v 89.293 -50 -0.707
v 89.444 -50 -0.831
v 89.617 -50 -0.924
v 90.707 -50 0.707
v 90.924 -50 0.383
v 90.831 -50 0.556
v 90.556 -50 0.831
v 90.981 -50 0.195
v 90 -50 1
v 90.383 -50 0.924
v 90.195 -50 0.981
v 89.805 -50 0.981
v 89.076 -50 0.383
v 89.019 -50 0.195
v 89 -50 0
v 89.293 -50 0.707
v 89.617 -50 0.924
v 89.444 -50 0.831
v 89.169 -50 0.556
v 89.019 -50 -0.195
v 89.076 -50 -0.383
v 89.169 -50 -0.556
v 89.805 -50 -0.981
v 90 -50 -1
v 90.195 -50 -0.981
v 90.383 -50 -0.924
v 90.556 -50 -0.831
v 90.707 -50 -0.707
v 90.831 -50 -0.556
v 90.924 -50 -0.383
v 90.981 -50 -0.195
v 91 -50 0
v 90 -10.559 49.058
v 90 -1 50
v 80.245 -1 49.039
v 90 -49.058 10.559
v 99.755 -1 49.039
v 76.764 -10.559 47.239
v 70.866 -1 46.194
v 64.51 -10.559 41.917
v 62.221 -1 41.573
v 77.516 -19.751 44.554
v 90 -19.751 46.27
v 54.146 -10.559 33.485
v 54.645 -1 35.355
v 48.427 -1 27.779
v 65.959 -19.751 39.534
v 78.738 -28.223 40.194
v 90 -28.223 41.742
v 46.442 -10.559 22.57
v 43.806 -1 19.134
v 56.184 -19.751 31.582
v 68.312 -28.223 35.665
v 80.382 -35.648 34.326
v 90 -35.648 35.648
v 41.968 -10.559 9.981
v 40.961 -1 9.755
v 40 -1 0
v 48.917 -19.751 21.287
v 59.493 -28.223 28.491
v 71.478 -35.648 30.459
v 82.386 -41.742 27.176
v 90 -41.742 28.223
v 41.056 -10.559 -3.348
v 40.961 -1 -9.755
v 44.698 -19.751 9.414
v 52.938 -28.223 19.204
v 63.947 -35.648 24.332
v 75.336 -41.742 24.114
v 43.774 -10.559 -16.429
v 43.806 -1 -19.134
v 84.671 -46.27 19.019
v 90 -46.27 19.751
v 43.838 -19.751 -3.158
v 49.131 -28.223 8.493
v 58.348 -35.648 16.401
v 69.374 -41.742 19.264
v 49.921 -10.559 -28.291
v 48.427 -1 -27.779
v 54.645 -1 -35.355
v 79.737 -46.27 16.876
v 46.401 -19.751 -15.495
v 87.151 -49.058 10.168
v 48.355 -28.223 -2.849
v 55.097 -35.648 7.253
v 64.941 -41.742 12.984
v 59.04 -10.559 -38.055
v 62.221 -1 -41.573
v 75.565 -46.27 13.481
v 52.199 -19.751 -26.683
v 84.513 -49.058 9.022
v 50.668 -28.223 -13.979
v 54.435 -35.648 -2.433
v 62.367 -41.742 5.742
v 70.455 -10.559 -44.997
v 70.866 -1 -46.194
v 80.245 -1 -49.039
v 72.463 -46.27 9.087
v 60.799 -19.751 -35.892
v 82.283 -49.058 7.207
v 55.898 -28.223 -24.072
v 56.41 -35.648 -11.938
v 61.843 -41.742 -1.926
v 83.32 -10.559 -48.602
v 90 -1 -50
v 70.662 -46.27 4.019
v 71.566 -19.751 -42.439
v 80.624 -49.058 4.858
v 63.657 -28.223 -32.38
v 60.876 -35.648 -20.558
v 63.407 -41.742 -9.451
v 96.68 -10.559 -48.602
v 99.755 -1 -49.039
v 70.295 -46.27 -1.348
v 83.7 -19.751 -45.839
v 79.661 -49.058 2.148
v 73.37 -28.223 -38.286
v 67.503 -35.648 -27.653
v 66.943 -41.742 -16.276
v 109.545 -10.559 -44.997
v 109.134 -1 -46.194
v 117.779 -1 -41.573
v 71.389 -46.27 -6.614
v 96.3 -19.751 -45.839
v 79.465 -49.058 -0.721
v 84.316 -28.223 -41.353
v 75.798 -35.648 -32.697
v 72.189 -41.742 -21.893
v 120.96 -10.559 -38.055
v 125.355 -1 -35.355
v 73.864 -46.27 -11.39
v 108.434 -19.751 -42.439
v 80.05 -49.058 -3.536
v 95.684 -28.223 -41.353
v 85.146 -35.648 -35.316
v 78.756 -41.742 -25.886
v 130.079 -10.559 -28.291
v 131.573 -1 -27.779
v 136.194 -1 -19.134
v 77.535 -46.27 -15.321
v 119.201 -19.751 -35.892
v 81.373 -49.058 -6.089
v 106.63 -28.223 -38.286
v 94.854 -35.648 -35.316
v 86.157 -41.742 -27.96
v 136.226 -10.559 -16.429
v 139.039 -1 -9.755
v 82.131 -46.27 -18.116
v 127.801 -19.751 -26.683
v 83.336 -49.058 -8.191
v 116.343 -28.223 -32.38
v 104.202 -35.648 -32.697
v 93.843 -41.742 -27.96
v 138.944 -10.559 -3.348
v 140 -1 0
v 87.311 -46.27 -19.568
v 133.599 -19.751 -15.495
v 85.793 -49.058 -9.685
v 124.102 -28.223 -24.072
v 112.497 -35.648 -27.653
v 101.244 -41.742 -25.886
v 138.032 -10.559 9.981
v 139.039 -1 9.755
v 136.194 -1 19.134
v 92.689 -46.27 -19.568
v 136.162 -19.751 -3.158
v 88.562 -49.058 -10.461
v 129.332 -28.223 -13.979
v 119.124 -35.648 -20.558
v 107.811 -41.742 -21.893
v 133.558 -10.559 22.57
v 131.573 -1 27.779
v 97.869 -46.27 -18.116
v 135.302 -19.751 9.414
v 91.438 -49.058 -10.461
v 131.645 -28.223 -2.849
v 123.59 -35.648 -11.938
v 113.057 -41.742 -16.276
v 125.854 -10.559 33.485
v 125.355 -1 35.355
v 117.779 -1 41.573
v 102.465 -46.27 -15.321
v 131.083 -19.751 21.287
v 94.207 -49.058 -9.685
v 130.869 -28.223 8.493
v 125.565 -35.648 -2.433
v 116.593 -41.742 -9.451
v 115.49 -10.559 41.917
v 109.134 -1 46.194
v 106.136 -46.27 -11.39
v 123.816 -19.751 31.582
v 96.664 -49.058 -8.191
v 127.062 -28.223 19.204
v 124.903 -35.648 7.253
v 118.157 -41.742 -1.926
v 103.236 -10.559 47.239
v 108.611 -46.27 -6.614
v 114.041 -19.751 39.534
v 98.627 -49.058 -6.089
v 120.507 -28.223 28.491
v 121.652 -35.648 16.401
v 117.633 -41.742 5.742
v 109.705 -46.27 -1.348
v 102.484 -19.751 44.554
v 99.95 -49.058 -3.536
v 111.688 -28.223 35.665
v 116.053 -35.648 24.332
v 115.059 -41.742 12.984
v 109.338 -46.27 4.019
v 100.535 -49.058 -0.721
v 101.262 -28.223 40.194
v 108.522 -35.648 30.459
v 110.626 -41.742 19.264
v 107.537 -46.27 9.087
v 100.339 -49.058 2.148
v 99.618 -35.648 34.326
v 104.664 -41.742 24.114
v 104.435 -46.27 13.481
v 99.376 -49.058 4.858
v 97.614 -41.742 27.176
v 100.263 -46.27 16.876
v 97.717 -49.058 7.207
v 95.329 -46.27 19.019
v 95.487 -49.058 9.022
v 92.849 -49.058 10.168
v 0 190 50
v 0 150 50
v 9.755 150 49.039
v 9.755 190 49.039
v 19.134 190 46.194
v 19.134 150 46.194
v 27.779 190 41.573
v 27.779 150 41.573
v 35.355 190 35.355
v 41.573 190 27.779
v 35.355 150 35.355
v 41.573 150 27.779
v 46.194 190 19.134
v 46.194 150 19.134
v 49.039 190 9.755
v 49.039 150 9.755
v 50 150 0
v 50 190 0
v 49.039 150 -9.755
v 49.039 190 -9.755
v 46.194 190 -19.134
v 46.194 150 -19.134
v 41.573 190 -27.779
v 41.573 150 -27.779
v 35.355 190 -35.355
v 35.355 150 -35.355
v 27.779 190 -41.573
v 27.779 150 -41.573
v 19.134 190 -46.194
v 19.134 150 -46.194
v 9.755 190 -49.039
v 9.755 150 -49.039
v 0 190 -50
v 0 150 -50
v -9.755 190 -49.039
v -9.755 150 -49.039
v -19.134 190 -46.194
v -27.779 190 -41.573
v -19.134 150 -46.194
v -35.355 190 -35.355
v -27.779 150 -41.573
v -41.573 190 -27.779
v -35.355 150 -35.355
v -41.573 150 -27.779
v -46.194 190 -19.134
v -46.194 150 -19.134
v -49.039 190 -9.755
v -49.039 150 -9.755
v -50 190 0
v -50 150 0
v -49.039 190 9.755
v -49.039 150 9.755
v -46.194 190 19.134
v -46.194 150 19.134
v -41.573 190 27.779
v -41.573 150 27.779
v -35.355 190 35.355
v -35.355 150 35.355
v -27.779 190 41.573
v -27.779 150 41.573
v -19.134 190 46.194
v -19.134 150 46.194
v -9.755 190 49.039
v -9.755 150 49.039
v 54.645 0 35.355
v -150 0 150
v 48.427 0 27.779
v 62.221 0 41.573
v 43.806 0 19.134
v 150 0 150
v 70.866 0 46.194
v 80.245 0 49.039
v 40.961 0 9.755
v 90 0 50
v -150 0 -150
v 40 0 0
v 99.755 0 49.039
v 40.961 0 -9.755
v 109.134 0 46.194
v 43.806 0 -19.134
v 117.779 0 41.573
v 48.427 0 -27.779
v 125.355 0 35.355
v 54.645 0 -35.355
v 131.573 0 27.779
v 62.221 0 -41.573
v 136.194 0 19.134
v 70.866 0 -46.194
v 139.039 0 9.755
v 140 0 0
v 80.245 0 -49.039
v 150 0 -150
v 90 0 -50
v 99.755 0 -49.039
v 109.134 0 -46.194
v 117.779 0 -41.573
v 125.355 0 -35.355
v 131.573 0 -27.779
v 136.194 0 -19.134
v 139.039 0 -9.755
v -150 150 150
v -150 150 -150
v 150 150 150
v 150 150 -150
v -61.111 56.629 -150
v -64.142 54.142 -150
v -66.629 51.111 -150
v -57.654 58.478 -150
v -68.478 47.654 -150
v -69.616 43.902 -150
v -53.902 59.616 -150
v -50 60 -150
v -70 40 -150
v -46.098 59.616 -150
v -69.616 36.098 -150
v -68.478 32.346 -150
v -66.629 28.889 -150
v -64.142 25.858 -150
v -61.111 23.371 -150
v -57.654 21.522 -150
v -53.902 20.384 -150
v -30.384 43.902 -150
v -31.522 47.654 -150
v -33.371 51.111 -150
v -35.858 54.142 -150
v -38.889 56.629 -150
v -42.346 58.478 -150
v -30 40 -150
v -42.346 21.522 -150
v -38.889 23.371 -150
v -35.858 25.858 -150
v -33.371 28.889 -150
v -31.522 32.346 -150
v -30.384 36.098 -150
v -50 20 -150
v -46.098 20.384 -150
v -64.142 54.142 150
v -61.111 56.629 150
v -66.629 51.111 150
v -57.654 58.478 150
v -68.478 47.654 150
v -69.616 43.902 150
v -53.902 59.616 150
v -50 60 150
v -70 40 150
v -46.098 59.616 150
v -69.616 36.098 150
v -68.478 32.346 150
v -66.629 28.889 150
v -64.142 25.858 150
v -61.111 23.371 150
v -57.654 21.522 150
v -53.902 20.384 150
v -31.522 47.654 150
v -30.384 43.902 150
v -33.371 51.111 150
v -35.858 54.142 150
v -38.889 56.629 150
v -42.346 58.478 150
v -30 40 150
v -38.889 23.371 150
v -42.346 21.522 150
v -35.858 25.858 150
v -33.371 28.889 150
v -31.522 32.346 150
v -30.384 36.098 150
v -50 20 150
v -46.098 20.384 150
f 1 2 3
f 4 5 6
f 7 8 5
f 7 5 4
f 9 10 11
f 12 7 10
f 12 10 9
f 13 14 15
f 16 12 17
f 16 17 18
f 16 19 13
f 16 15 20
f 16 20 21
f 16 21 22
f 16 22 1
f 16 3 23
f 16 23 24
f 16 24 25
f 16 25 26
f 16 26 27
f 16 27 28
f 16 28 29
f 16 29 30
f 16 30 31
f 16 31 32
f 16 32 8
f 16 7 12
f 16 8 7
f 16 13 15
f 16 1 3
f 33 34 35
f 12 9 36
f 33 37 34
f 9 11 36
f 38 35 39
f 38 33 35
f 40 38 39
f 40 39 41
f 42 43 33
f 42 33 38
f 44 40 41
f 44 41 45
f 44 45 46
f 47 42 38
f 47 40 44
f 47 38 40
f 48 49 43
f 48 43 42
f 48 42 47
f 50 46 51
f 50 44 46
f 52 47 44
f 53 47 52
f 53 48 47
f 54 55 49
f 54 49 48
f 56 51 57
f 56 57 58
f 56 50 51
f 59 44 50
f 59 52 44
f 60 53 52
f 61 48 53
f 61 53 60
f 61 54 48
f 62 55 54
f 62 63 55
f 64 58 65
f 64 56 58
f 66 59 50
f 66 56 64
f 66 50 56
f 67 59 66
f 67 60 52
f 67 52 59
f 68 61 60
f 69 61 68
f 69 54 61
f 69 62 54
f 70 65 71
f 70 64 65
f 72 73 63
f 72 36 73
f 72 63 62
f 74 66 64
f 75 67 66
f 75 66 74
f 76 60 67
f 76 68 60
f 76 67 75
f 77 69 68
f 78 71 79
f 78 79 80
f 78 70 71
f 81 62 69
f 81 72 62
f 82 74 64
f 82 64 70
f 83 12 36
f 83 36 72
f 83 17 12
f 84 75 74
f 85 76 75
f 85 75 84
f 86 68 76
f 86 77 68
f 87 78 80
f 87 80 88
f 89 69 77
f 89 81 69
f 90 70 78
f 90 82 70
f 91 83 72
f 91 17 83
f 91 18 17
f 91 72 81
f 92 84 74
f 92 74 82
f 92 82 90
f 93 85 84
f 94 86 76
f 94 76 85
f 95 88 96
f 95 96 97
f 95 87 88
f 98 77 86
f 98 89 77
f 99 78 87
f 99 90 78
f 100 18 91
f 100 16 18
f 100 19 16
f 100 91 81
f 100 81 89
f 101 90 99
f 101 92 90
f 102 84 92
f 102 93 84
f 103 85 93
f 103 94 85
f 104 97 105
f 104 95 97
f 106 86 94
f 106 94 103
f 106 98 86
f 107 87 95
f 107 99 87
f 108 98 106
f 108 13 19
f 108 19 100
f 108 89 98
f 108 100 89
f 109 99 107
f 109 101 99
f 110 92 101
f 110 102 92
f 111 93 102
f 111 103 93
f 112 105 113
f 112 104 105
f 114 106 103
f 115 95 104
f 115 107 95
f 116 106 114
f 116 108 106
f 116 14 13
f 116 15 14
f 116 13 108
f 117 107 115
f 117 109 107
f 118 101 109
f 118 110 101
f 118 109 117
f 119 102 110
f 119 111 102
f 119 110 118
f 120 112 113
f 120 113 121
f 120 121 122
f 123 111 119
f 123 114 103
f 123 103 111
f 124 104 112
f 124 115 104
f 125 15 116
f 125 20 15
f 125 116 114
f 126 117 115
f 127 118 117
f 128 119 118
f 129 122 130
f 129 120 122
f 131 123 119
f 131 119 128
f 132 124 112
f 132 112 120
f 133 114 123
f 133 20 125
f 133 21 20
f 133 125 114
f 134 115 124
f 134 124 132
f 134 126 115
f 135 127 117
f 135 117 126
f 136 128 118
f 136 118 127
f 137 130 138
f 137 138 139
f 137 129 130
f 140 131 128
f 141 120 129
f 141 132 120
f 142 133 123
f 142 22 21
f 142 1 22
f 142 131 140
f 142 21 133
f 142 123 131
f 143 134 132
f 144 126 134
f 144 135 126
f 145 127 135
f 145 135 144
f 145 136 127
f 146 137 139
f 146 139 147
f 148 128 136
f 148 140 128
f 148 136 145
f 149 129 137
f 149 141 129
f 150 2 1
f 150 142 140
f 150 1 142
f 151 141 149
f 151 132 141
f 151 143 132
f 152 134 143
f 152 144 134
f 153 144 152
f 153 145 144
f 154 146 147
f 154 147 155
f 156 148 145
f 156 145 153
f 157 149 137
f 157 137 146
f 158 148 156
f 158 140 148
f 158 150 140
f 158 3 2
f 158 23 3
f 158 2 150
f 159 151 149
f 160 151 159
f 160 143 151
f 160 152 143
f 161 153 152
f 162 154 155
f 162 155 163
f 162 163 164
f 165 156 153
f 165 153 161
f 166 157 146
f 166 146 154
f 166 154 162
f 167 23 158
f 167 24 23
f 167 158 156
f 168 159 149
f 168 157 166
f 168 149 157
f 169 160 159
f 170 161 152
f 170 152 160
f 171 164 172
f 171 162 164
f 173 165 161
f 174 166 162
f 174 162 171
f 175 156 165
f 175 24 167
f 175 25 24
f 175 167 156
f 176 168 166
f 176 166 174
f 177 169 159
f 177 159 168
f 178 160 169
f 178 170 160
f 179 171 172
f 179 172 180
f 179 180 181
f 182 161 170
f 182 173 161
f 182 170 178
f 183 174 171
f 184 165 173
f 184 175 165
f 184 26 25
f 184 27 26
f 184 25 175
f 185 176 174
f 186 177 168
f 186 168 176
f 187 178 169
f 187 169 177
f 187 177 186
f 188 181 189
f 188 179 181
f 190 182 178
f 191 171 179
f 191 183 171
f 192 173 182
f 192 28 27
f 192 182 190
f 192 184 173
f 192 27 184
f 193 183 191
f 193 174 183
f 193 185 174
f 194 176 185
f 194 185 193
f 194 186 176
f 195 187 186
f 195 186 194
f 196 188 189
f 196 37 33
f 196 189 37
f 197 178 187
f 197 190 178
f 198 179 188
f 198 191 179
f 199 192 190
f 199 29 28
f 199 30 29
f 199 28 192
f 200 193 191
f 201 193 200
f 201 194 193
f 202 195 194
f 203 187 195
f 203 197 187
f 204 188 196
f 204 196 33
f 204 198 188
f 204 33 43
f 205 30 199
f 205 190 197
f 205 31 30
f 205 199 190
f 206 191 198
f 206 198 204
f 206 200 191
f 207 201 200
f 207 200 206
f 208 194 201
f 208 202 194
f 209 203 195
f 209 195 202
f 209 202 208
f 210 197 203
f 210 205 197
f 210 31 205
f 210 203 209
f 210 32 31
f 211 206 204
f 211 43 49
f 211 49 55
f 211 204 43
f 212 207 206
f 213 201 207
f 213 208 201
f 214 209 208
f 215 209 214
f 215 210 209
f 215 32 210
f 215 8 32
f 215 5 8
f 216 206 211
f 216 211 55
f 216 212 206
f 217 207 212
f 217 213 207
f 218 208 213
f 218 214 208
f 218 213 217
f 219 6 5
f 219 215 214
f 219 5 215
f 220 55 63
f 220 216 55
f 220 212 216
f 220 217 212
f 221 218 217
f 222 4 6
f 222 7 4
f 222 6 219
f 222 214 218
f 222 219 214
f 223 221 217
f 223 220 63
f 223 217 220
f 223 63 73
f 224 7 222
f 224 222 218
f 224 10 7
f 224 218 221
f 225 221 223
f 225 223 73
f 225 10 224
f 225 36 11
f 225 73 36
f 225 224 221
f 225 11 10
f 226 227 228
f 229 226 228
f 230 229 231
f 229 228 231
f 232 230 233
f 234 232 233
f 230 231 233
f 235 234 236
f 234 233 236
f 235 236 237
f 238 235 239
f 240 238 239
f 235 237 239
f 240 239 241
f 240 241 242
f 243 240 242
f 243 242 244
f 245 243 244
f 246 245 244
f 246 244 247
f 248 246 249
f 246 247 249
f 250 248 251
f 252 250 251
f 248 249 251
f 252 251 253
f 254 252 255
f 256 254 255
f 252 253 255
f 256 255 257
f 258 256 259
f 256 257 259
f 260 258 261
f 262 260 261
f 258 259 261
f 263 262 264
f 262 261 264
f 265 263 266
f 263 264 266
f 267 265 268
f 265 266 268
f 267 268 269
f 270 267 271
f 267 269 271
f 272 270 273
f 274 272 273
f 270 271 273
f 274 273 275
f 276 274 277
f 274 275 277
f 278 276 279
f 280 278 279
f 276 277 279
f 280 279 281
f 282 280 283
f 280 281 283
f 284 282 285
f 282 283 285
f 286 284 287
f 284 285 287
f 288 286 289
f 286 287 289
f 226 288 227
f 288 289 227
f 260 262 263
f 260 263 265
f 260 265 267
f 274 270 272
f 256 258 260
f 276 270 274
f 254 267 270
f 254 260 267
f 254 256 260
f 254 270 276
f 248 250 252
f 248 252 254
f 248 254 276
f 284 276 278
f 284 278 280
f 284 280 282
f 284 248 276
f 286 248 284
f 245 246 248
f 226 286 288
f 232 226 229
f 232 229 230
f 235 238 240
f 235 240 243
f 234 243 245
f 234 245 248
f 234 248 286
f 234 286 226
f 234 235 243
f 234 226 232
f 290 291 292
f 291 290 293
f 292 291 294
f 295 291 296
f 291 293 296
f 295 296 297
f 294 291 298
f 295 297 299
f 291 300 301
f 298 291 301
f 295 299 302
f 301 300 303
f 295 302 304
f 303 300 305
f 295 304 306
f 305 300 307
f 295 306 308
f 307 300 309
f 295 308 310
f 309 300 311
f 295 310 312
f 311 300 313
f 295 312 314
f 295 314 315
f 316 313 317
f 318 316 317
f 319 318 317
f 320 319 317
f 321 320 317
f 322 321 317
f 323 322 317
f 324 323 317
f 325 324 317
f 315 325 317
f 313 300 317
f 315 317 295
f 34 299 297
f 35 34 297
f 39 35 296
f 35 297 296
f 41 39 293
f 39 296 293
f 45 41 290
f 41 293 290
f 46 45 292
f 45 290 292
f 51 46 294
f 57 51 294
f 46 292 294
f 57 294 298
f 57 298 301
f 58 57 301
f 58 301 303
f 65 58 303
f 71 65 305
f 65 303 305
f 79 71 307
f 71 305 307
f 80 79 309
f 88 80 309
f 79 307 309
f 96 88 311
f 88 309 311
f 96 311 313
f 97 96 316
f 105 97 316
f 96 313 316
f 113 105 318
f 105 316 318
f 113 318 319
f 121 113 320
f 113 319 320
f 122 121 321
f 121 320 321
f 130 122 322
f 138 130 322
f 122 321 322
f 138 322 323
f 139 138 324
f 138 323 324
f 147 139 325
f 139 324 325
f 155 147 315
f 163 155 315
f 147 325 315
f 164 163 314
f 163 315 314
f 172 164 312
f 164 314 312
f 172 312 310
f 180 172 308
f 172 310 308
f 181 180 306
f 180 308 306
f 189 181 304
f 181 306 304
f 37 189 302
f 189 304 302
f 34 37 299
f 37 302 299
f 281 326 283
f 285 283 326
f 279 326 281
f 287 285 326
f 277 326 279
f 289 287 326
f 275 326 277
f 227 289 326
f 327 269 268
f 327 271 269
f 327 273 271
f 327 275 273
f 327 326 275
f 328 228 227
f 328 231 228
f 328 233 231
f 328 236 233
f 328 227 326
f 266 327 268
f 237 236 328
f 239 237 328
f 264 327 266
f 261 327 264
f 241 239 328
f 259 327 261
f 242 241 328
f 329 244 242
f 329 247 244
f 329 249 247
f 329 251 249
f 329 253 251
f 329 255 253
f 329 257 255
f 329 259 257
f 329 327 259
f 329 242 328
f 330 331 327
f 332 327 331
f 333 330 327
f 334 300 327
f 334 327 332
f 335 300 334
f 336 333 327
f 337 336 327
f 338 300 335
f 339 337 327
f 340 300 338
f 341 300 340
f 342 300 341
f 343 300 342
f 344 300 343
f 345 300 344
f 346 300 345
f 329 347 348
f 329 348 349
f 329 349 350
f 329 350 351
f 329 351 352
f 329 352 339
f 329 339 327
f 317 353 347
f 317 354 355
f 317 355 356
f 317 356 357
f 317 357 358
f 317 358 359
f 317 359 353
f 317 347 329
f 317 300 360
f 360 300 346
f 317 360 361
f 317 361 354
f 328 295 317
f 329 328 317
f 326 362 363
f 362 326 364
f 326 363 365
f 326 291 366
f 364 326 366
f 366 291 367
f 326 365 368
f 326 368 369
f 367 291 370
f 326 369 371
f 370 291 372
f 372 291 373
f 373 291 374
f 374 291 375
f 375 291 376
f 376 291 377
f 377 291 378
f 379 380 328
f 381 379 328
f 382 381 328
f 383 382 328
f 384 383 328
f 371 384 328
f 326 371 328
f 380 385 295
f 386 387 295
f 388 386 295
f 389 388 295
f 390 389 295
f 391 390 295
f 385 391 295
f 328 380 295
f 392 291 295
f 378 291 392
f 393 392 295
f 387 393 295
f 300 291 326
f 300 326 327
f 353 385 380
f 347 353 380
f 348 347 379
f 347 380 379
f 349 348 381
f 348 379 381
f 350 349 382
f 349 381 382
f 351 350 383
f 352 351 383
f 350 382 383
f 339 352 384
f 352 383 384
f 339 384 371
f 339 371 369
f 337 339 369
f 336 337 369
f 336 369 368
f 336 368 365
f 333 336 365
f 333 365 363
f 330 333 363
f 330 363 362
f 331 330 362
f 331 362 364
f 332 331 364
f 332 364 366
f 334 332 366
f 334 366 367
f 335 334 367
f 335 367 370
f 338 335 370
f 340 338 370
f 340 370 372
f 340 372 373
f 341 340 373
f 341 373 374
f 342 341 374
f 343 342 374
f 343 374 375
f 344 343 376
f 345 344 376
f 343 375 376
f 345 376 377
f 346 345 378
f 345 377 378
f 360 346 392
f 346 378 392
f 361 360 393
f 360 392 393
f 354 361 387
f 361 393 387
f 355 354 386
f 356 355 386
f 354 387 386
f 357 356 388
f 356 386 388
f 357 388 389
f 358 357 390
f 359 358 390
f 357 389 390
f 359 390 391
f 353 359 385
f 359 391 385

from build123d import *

# Parameters (mm, degrees)
SKETCH2_W           = 300
SKETCH2_H           = 300
BOSS_EXTRUDE1_DEPTH = 150
SKETCH4_R           = 20
CUT_EXTRUDE1_DEPTH  = 368.423461417
SKETCH8_R           = 50
BOSS_EXTRUDE3_DEPTH = 40
SKETCH10_R          = 50
BOSS_EXTRUDE4_DEPTH = 50
FILLET1_R           = 49


with BuildPart() as part:
    # Sketch2 → Boss-Extrude1 (new body)
    with BuildSketch(Plane(origin=(0, 0, 0), x_dir=(1, 0, 0), z_dir=(0, 1, 0))):
        Rectangle(SKETCH2_W, SKETCH2_H)
    extrude(amount=BOSS_EXTRUDE1_DEPTH)

    # Sketch4 → Cut-Extrude1 (cut, through all)
    with BuildSketch(Plane.XY.offset(150)):
        with Locations((-50, 40)):
            Circle(SKETCH4_R)
    extrude(amount=-CUT_EXTRUDE1_DEPTH, mode=Mode.SUBTRACT)

    # Sketch8 → Boss-Extrude3 (add)
    with BuildSketch(Plane(origin=(0, 150, 0), x_dir=(1, 0, 0), z_dir=(0, 1, 0))):
        with Locations(Location((0, 0, 0), (0, 0, 270))):
            Circle(SKETCH8_R)
    extrude(amount=BOSS_EXTRUDE3_DEPTH)

    # Sketch10 → Boss-Extrude4 (add)
    with BuildSketch(Plane(origin=(0, 0, 0), x_dir=(-1, 0, 0), z_dir=(0, -1, 0))):
        with Locations(Location((-90, 0, 0), (0, 0, 270))):
            Circle(SKETCH10_R)
    extrude(amount=BOSS_EXTRUDE4_DEPTH)

    # Fillet1
    fillet1_edges = [part.edges().sort_by_distance(p)[0] for p in [
        (90, -50, -50),
    ]]
    fillet(fillet1_edges, radius=FILLET1_R)


solid = part.part
